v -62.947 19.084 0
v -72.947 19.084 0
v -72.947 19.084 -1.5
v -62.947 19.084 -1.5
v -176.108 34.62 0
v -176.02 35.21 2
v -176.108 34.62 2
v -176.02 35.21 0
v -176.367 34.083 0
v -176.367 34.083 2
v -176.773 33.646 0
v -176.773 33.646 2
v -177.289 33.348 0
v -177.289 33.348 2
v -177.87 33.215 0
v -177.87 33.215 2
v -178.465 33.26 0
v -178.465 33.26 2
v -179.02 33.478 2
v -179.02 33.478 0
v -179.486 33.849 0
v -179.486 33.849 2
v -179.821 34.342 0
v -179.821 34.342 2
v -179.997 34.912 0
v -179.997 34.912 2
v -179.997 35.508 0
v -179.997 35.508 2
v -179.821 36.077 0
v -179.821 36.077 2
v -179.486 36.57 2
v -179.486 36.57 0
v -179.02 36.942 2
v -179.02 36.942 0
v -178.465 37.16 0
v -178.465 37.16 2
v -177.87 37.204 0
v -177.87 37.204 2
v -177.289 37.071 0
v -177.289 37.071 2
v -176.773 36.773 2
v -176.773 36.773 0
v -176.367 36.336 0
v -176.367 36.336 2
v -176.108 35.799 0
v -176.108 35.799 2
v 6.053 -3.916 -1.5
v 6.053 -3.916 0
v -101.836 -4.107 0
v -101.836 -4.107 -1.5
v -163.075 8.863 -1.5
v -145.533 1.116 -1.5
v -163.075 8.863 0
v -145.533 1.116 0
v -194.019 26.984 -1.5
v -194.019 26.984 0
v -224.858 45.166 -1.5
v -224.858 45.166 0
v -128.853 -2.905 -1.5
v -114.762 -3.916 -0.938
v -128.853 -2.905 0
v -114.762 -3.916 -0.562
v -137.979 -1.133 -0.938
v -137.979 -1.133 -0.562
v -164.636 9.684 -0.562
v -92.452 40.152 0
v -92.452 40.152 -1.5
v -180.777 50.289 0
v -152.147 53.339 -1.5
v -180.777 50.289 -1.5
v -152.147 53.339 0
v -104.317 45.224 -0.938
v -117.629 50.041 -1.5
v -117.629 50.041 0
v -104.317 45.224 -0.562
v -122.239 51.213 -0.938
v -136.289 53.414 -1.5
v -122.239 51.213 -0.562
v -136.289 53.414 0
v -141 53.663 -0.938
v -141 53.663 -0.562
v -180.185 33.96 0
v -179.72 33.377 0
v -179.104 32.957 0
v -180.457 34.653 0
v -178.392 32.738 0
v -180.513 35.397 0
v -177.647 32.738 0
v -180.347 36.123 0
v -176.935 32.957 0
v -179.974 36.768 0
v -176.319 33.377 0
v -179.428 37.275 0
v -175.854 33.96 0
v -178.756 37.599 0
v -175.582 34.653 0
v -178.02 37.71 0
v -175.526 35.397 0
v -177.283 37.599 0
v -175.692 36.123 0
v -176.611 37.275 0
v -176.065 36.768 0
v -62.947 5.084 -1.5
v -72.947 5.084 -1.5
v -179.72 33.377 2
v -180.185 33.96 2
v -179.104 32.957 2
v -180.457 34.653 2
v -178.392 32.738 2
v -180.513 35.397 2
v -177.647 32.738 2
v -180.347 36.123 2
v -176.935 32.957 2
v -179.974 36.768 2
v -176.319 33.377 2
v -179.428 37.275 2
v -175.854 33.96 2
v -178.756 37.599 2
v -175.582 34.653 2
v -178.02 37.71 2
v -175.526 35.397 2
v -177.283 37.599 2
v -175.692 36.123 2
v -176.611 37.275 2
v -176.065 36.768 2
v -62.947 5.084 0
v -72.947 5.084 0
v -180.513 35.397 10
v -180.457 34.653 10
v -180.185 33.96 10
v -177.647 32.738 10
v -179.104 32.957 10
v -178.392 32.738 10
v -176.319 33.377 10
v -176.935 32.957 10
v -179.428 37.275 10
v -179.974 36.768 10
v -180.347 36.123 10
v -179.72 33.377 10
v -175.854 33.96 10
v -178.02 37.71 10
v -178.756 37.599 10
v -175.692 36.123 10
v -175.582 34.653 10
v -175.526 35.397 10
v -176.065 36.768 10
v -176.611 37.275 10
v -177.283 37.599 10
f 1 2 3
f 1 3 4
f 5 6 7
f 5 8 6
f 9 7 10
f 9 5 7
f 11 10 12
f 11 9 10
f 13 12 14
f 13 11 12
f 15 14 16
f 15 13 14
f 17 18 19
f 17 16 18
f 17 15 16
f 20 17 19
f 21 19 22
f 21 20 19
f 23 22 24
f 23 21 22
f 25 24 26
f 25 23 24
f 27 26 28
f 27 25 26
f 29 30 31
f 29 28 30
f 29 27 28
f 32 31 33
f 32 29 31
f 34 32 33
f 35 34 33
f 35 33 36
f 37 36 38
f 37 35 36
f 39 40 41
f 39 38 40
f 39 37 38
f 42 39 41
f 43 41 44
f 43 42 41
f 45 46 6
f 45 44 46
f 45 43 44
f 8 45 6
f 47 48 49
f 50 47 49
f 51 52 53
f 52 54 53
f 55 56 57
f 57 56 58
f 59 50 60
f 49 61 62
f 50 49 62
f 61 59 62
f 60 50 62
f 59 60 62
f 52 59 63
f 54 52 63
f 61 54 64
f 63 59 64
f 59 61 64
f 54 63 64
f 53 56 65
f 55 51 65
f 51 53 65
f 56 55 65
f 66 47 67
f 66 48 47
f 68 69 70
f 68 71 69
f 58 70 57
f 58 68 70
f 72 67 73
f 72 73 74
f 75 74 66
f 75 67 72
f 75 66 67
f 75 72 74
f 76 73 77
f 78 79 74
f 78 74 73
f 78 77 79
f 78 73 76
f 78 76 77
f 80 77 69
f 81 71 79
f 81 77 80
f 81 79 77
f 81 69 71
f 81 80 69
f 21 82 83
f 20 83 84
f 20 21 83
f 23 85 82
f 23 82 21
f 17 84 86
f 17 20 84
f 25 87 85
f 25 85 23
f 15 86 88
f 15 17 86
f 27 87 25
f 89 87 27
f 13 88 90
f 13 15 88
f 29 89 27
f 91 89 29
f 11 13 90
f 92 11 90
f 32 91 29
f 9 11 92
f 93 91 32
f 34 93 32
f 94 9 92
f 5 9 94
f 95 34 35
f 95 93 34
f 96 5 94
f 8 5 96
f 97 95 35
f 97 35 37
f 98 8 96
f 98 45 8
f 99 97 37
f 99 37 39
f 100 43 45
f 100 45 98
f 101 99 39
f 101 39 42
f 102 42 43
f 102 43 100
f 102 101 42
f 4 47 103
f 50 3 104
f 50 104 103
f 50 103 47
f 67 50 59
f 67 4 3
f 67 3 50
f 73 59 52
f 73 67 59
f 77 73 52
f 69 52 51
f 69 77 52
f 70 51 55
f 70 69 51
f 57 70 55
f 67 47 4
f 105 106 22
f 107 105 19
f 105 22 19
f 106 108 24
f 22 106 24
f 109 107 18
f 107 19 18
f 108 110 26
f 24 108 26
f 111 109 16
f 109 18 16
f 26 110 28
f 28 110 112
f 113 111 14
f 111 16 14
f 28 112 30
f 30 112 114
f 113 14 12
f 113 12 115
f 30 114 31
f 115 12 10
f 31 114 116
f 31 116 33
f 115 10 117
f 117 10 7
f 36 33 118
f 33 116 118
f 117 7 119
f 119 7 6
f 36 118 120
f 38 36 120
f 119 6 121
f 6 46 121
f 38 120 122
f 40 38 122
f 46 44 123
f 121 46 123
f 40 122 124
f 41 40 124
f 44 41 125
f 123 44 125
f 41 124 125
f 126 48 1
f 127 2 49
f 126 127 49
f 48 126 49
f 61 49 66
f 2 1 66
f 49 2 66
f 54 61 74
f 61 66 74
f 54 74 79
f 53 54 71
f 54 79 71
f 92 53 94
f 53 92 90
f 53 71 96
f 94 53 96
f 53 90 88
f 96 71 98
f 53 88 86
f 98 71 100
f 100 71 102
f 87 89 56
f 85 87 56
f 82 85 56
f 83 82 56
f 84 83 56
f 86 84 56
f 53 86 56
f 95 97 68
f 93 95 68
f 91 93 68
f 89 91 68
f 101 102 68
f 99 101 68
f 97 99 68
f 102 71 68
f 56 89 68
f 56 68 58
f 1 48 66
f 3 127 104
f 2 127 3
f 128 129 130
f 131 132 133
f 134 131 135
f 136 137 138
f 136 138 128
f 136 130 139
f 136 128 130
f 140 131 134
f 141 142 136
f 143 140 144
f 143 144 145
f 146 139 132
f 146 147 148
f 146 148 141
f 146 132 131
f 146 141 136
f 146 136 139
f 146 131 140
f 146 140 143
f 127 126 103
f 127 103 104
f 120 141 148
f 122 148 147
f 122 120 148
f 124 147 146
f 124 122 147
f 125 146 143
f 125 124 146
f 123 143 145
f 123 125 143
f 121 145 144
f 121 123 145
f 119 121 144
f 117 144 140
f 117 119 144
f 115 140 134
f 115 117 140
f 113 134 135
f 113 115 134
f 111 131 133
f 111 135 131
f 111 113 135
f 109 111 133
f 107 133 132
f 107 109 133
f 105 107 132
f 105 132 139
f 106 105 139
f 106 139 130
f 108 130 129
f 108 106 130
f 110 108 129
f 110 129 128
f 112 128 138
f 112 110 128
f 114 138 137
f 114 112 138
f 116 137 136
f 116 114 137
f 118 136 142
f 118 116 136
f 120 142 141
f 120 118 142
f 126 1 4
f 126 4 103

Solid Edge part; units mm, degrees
sketch "Sketch1" plane through (0, 0, 0) normal (0, 0, 1) x (1, 0, 0)
  spline S0 degree 3 poles (6.0526, -3.916) (-16.0968, -3.916) (-53.3701, -3.6894) (-97.6026, -4.4189) (-123.6184, -3.6826) (-131.3681, -2.5848) (-145.527, 0.3726) (-166.7781, 9.9712) (-195.0718, 27.9174) (-213.8175, 38.6607) (-224.8582, 45.1656) knots 0 0 0 0 0.24868 0.497359 0.533813 0.570267 0.593822 0.712253 0.856127 1 1 1 1
  spline S1 degree 3 poles (6.0526, -3.916) (-14.1819, 5.093) (-48.3266, 20.0457) (-88.4328, 38.7056) (-112.5044, 48.612) (-124.644, 52.0878) (-139.1094, 54.1956) (-162.2143, 52.7729) (-190.6657, 48.8879) (-212.1262, 46.6175) (-224.8582, 45.1656) knots 0 0 0 0 0.248622 0.497244 0.53369 0.570135 0.652958 0.71232 0.85616 1 1 1 1
extrude "Protrusion1" add sketch "Sketch1" against normal blind 1.5
sketch "Sketch2" plane through (-109.4028, 24.8883, 0) normal (0, 0, 1) x (-1, 0, 0)
  line L0 (-36.4554, 19.8043) -> (-36.4554, 5.8043)
  line L1 (-36.4554, 5.8043) -> (-46.4554, 5.8043)
  line L2 (-46.4554, 5.8043) -> (-46.4554, 19.8043)
  line L3 (-46.4554, 19.8043) -> (-36.4554, 19.8043)
extrude "Cutout1" cut sketch "Sketch2" against normal through all
sketch "Sketch3" plane through (-109.4028, 24.8883, 0) normal (0, 0, 1) x (0, 1, 0)
  circle A0 centre (10.3214, 68.6167) radius 2.5
extrude "ExtrudedProtrusion_2" add sketch "Sketch3" along normal blind 10
sketch "Sketch4" plane through (-109.4028, 24.8883, 0) normal (0, 0, 1) x (1, 0, 0)
  circle A0 centre (-68.6167, 10.3214) radius 2
extrude "ExtrudedCutout_2" cut sketch "Sketch4" along normal blind 2 flip side to cut
